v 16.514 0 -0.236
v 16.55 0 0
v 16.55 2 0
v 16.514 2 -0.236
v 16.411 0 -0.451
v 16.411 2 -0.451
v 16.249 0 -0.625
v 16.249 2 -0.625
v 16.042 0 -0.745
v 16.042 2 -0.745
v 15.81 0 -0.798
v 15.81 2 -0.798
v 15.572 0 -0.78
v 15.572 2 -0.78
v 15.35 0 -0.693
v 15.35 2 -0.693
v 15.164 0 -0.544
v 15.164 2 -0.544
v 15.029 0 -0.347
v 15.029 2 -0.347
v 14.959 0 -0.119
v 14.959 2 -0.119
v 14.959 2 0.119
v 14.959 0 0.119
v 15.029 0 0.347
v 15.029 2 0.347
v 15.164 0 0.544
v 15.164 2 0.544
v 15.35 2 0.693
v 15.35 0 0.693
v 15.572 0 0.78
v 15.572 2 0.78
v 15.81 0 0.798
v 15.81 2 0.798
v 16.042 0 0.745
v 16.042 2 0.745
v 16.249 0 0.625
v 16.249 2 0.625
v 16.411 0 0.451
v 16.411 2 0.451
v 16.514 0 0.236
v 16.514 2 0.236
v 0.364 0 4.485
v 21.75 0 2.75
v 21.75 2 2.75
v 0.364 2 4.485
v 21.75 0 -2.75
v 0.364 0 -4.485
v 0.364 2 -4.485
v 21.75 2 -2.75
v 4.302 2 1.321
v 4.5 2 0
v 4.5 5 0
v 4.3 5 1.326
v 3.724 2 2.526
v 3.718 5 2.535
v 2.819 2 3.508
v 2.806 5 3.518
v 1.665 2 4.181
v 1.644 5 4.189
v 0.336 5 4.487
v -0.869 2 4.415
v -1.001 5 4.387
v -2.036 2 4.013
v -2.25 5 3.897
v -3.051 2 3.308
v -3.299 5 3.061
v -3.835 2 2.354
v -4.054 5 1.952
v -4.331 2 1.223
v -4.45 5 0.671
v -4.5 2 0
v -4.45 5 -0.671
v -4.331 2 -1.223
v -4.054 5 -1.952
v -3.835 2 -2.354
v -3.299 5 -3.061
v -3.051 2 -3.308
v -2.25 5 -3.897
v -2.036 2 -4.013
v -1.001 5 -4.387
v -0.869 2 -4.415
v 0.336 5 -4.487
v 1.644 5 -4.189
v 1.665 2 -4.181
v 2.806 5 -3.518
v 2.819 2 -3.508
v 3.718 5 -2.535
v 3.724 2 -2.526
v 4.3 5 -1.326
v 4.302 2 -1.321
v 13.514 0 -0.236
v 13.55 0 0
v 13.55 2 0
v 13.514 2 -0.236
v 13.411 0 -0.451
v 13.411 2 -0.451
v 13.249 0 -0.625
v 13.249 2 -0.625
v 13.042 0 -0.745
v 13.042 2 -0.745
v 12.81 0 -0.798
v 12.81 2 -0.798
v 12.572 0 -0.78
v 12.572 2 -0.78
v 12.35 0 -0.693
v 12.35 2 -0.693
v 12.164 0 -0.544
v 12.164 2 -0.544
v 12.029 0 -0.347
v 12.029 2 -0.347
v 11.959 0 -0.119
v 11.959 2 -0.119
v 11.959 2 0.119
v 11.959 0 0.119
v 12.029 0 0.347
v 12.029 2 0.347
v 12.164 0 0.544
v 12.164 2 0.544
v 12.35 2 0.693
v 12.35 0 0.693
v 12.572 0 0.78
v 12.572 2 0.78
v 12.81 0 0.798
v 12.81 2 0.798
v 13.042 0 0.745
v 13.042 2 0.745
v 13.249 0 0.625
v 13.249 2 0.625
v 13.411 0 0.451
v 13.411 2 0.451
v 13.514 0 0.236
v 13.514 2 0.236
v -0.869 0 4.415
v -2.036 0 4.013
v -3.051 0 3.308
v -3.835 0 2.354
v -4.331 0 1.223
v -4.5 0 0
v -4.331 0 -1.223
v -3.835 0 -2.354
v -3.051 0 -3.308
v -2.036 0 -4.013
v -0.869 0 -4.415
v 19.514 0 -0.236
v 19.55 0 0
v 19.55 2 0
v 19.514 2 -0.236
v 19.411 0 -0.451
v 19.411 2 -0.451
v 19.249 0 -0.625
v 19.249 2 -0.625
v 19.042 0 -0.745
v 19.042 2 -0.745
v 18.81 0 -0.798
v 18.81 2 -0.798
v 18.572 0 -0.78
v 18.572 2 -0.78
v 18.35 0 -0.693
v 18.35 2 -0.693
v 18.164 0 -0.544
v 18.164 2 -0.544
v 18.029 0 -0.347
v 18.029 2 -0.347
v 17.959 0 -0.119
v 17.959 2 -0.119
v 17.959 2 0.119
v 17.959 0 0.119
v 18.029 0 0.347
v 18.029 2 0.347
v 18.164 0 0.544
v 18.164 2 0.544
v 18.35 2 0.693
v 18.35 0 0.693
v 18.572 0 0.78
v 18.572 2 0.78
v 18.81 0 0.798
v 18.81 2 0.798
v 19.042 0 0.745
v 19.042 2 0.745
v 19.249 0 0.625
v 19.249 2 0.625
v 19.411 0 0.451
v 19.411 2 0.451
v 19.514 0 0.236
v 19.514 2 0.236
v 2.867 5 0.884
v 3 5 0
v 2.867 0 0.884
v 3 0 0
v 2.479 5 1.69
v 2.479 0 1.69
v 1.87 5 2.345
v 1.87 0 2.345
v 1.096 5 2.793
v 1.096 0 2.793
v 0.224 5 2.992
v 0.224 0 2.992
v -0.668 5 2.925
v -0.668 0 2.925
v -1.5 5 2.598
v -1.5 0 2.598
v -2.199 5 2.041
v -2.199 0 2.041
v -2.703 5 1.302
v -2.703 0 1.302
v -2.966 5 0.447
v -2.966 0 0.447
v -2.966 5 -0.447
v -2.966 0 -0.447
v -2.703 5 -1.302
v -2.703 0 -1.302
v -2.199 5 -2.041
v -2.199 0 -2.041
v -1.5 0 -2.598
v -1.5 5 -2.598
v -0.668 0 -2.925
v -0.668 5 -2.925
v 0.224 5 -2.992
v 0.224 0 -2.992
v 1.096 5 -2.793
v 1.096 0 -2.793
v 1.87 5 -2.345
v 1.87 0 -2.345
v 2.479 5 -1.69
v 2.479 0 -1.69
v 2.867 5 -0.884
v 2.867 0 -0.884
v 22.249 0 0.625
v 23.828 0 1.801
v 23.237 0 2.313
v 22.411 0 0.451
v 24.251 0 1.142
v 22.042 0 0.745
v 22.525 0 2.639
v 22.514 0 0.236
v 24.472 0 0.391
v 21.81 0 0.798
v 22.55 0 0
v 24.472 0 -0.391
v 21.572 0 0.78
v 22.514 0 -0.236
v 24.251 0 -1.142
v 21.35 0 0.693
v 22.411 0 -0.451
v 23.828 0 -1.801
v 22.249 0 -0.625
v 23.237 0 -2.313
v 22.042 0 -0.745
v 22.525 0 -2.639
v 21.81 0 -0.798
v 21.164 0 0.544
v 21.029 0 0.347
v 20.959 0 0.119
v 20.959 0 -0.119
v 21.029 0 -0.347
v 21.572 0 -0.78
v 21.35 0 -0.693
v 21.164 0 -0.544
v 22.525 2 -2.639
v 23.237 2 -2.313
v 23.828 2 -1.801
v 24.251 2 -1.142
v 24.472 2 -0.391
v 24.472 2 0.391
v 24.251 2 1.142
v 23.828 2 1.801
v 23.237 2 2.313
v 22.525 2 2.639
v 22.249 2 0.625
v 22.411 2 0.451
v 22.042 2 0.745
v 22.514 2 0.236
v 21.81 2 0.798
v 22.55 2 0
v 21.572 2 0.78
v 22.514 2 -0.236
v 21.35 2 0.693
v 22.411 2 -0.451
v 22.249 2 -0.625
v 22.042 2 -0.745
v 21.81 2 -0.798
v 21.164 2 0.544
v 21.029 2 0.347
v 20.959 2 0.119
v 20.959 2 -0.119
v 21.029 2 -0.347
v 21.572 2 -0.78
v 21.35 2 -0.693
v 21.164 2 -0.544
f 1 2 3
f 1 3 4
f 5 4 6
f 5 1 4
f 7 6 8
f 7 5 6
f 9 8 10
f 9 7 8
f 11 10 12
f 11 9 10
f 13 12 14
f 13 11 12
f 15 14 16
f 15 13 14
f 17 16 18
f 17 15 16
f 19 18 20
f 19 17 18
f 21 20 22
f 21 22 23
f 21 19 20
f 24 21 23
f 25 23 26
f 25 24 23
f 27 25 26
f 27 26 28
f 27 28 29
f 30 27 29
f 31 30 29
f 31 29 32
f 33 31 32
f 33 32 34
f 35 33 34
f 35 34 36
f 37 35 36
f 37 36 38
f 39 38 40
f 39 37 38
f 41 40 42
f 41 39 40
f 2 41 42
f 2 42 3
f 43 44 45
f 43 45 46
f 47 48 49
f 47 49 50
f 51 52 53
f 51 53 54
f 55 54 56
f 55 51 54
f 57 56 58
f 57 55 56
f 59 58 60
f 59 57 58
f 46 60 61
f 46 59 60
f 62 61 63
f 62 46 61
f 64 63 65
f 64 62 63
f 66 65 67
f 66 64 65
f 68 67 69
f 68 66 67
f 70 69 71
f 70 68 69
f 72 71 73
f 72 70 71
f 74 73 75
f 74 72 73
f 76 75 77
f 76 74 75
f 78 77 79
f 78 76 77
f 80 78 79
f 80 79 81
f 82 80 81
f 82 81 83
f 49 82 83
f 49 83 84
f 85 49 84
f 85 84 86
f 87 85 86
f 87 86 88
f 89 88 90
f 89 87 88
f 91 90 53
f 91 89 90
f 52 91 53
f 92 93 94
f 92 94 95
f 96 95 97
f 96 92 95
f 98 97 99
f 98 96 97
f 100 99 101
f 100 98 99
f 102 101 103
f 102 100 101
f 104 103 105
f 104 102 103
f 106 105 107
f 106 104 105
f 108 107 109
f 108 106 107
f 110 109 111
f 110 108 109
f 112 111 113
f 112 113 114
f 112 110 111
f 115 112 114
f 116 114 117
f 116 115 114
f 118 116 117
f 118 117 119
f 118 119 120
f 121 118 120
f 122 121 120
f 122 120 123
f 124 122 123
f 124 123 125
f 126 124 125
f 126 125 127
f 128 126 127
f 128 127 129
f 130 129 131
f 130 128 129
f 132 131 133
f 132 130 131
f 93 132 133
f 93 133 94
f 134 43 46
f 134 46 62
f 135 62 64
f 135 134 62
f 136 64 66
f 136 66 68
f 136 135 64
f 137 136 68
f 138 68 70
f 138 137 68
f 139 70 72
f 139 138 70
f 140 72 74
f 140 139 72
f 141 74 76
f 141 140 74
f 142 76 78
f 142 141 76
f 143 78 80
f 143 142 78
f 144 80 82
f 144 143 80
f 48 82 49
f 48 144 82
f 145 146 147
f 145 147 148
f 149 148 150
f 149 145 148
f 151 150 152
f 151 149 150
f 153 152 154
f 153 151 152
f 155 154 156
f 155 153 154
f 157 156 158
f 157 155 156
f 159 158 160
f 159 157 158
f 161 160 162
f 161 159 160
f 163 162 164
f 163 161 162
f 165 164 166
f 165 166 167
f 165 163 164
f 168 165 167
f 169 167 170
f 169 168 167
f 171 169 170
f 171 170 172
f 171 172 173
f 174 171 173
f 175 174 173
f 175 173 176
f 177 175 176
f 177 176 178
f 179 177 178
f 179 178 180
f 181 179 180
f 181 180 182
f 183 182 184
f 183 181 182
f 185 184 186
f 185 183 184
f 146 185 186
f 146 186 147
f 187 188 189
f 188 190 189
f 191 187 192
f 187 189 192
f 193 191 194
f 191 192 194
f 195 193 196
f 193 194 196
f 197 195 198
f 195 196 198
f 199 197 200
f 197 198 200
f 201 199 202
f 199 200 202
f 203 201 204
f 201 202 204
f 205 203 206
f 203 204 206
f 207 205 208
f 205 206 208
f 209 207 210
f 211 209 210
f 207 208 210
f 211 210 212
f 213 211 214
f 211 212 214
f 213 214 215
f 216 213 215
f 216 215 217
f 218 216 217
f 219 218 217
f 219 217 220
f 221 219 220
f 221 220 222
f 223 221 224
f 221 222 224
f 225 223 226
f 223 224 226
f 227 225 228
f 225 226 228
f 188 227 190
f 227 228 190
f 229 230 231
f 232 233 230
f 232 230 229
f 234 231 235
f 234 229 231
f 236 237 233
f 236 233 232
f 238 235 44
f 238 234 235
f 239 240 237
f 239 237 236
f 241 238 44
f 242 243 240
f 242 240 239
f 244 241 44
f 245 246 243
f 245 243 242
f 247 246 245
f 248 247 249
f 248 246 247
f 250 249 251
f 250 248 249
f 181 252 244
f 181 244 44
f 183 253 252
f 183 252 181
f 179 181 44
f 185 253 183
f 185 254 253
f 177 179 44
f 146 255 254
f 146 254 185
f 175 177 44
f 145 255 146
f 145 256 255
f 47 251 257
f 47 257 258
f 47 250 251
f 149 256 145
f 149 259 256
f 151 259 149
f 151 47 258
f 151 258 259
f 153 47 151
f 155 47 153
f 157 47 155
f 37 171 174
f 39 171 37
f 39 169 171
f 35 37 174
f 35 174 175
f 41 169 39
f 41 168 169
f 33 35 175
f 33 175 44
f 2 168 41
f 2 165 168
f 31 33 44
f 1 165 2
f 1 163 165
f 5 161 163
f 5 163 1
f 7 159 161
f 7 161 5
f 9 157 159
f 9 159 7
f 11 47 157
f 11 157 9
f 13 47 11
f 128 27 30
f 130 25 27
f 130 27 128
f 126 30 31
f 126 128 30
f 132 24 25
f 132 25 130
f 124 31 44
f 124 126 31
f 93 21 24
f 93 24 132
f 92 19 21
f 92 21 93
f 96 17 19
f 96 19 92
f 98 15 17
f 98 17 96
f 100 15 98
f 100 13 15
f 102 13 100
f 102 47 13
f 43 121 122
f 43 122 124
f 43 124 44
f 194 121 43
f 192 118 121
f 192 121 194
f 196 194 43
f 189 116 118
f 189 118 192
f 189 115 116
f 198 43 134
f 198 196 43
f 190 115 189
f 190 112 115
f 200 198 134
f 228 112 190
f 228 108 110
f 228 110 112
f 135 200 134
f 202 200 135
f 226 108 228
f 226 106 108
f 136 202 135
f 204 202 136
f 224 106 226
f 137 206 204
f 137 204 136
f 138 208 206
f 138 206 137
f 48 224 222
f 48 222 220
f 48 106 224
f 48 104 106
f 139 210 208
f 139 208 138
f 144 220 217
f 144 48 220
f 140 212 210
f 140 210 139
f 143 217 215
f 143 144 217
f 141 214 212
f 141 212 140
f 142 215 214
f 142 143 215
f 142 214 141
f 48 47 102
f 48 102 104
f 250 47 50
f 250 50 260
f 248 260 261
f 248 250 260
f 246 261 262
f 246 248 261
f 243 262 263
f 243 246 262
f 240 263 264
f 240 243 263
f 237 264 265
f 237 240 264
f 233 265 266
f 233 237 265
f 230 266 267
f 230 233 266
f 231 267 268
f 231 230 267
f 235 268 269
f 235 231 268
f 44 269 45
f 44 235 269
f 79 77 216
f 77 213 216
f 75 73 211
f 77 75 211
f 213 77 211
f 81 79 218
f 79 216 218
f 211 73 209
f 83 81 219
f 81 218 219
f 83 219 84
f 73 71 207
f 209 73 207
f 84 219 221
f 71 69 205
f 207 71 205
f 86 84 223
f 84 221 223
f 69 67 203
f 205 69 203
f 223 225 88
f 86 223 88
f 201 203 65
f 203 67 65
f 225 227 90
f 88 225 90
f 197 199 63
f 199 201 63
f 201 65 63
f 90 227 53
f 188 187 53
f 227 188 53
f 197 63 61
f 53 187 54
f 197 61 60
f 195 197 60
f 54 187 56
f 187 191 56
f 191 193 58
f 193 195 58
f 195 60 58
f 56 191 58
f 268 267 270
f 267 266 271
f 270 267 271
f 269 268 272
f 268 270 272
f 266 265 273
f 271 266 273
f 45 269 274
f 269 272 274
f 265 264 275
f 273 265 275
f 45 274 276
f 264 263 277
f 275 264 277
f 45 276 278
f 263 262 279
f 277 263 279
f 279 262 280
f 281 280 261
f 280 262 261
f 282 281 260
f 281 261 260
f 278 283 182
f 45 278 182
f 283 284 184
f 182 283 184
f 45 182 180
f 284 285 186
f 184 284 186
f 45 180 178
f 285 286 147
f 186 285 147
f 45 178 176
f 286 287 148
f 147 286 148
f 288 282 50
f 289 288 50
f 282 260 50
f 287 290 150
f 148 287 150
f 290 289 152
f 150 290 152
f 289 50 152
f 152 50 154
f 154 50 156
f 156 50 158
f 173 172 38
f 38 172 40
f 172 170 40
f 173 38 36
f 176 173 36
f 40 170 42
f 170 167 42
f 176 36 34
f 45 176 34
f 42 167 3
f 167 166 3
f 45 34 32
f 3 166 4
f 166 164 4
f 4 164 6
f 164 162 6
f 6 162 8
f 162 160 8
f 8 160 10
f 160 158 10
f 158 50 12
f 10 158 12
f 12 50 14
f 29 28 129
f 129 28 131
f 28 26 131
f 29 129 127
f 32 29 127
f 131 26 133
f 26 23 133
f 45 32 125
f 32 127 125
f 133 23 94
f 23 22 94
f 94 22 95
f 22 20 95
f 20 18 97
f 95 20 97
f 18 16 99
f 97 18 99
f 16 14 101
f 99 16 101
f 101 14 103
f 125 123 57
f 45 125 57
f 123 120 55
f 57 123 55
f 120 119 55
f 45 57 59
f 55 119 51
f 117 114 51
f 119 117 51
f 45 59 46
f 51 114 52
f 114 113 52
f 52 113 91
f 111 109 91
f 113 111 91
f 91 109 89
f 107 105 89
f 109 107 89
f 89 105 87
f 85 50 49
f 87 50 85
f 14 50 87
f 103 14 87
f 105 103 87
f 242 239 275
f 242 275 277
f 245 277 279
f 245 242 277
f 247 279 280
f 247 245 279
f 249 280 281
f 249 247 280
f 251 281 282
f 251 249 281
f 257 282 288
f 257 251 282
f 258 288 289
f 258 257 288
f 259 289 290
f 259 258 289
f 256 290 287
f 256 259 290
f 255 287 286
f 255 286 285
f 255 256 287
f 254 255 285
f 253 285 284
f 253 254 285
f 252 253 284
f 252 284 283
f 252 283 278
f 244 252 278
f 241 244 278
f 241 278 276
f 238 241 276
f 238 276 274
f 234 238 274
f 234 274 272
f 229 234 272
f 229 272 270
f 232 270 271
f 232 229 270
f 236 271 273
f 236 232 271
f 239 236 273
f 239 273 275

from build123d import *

# Parameters (mm, degrees)
SKETCH_1_R      = 3
SKETCH_1_R_2    = 0.8
EXTRUDE_1_DEPTH = 2
SKETCH_2_R      = 4.5
SKETCH_2_R_2    = 3
EXTRUDE_2_DEPTH = 3


with BuildPart() as part:
    # 草圖1 → 伸長1 (new body)
    with BuildSketch(Plane(origin=(0, 0, 0), x_dir=(1, 0, 0), z_dir=(0, 1, 0))):
        with BuildLine():
            Line((0.363932704, 4.485259523), (21.75, 2.75))
            ThreePointArc((21.75, 2.75), (24.5, 0), (21.75, -2.75))
            Line((21.75, -2.75), (0.363932704, -4.485259523))
            ThreePointArc((0.363932704, -4.485259523), (-4.5, 0), (0.363932704, 4.485259523))
        make_face()
        Circle(SKETCH_1_R, mode=Mode.SUBTRACT)
        with Locations((12.75, 0)):
            Circle(SKETCH_1_R_2, mode=Mode.SUBTRACT)
        with Locations((15.75, 0)):
            Circle(SKETCH_1_R_2, mode=Mode.SUBTRACT)
        with Locations((18.75, 0)):
            Circle(SKETCH_1_R_2, mode=Mode.SUBTRACT)
        with Locations((21.75, 0)):
            Circle(SKETCH_1_R_2, mode=Mode.SUBTRACT)
    extrude(amount=EXTRUDE_1_DEPTH)

    # 草圖2 → 伸長2 (add)
    with BuildSketch(Plane.XZ.offset(-2)):
        Circle(SKETCH_2_R)
        Circle(SKETCH_2_R_2, mode=Mode.SUBTRACT)
    extrude(amount=-EXTRUDE_2_DEPTH)


solid = part.part
